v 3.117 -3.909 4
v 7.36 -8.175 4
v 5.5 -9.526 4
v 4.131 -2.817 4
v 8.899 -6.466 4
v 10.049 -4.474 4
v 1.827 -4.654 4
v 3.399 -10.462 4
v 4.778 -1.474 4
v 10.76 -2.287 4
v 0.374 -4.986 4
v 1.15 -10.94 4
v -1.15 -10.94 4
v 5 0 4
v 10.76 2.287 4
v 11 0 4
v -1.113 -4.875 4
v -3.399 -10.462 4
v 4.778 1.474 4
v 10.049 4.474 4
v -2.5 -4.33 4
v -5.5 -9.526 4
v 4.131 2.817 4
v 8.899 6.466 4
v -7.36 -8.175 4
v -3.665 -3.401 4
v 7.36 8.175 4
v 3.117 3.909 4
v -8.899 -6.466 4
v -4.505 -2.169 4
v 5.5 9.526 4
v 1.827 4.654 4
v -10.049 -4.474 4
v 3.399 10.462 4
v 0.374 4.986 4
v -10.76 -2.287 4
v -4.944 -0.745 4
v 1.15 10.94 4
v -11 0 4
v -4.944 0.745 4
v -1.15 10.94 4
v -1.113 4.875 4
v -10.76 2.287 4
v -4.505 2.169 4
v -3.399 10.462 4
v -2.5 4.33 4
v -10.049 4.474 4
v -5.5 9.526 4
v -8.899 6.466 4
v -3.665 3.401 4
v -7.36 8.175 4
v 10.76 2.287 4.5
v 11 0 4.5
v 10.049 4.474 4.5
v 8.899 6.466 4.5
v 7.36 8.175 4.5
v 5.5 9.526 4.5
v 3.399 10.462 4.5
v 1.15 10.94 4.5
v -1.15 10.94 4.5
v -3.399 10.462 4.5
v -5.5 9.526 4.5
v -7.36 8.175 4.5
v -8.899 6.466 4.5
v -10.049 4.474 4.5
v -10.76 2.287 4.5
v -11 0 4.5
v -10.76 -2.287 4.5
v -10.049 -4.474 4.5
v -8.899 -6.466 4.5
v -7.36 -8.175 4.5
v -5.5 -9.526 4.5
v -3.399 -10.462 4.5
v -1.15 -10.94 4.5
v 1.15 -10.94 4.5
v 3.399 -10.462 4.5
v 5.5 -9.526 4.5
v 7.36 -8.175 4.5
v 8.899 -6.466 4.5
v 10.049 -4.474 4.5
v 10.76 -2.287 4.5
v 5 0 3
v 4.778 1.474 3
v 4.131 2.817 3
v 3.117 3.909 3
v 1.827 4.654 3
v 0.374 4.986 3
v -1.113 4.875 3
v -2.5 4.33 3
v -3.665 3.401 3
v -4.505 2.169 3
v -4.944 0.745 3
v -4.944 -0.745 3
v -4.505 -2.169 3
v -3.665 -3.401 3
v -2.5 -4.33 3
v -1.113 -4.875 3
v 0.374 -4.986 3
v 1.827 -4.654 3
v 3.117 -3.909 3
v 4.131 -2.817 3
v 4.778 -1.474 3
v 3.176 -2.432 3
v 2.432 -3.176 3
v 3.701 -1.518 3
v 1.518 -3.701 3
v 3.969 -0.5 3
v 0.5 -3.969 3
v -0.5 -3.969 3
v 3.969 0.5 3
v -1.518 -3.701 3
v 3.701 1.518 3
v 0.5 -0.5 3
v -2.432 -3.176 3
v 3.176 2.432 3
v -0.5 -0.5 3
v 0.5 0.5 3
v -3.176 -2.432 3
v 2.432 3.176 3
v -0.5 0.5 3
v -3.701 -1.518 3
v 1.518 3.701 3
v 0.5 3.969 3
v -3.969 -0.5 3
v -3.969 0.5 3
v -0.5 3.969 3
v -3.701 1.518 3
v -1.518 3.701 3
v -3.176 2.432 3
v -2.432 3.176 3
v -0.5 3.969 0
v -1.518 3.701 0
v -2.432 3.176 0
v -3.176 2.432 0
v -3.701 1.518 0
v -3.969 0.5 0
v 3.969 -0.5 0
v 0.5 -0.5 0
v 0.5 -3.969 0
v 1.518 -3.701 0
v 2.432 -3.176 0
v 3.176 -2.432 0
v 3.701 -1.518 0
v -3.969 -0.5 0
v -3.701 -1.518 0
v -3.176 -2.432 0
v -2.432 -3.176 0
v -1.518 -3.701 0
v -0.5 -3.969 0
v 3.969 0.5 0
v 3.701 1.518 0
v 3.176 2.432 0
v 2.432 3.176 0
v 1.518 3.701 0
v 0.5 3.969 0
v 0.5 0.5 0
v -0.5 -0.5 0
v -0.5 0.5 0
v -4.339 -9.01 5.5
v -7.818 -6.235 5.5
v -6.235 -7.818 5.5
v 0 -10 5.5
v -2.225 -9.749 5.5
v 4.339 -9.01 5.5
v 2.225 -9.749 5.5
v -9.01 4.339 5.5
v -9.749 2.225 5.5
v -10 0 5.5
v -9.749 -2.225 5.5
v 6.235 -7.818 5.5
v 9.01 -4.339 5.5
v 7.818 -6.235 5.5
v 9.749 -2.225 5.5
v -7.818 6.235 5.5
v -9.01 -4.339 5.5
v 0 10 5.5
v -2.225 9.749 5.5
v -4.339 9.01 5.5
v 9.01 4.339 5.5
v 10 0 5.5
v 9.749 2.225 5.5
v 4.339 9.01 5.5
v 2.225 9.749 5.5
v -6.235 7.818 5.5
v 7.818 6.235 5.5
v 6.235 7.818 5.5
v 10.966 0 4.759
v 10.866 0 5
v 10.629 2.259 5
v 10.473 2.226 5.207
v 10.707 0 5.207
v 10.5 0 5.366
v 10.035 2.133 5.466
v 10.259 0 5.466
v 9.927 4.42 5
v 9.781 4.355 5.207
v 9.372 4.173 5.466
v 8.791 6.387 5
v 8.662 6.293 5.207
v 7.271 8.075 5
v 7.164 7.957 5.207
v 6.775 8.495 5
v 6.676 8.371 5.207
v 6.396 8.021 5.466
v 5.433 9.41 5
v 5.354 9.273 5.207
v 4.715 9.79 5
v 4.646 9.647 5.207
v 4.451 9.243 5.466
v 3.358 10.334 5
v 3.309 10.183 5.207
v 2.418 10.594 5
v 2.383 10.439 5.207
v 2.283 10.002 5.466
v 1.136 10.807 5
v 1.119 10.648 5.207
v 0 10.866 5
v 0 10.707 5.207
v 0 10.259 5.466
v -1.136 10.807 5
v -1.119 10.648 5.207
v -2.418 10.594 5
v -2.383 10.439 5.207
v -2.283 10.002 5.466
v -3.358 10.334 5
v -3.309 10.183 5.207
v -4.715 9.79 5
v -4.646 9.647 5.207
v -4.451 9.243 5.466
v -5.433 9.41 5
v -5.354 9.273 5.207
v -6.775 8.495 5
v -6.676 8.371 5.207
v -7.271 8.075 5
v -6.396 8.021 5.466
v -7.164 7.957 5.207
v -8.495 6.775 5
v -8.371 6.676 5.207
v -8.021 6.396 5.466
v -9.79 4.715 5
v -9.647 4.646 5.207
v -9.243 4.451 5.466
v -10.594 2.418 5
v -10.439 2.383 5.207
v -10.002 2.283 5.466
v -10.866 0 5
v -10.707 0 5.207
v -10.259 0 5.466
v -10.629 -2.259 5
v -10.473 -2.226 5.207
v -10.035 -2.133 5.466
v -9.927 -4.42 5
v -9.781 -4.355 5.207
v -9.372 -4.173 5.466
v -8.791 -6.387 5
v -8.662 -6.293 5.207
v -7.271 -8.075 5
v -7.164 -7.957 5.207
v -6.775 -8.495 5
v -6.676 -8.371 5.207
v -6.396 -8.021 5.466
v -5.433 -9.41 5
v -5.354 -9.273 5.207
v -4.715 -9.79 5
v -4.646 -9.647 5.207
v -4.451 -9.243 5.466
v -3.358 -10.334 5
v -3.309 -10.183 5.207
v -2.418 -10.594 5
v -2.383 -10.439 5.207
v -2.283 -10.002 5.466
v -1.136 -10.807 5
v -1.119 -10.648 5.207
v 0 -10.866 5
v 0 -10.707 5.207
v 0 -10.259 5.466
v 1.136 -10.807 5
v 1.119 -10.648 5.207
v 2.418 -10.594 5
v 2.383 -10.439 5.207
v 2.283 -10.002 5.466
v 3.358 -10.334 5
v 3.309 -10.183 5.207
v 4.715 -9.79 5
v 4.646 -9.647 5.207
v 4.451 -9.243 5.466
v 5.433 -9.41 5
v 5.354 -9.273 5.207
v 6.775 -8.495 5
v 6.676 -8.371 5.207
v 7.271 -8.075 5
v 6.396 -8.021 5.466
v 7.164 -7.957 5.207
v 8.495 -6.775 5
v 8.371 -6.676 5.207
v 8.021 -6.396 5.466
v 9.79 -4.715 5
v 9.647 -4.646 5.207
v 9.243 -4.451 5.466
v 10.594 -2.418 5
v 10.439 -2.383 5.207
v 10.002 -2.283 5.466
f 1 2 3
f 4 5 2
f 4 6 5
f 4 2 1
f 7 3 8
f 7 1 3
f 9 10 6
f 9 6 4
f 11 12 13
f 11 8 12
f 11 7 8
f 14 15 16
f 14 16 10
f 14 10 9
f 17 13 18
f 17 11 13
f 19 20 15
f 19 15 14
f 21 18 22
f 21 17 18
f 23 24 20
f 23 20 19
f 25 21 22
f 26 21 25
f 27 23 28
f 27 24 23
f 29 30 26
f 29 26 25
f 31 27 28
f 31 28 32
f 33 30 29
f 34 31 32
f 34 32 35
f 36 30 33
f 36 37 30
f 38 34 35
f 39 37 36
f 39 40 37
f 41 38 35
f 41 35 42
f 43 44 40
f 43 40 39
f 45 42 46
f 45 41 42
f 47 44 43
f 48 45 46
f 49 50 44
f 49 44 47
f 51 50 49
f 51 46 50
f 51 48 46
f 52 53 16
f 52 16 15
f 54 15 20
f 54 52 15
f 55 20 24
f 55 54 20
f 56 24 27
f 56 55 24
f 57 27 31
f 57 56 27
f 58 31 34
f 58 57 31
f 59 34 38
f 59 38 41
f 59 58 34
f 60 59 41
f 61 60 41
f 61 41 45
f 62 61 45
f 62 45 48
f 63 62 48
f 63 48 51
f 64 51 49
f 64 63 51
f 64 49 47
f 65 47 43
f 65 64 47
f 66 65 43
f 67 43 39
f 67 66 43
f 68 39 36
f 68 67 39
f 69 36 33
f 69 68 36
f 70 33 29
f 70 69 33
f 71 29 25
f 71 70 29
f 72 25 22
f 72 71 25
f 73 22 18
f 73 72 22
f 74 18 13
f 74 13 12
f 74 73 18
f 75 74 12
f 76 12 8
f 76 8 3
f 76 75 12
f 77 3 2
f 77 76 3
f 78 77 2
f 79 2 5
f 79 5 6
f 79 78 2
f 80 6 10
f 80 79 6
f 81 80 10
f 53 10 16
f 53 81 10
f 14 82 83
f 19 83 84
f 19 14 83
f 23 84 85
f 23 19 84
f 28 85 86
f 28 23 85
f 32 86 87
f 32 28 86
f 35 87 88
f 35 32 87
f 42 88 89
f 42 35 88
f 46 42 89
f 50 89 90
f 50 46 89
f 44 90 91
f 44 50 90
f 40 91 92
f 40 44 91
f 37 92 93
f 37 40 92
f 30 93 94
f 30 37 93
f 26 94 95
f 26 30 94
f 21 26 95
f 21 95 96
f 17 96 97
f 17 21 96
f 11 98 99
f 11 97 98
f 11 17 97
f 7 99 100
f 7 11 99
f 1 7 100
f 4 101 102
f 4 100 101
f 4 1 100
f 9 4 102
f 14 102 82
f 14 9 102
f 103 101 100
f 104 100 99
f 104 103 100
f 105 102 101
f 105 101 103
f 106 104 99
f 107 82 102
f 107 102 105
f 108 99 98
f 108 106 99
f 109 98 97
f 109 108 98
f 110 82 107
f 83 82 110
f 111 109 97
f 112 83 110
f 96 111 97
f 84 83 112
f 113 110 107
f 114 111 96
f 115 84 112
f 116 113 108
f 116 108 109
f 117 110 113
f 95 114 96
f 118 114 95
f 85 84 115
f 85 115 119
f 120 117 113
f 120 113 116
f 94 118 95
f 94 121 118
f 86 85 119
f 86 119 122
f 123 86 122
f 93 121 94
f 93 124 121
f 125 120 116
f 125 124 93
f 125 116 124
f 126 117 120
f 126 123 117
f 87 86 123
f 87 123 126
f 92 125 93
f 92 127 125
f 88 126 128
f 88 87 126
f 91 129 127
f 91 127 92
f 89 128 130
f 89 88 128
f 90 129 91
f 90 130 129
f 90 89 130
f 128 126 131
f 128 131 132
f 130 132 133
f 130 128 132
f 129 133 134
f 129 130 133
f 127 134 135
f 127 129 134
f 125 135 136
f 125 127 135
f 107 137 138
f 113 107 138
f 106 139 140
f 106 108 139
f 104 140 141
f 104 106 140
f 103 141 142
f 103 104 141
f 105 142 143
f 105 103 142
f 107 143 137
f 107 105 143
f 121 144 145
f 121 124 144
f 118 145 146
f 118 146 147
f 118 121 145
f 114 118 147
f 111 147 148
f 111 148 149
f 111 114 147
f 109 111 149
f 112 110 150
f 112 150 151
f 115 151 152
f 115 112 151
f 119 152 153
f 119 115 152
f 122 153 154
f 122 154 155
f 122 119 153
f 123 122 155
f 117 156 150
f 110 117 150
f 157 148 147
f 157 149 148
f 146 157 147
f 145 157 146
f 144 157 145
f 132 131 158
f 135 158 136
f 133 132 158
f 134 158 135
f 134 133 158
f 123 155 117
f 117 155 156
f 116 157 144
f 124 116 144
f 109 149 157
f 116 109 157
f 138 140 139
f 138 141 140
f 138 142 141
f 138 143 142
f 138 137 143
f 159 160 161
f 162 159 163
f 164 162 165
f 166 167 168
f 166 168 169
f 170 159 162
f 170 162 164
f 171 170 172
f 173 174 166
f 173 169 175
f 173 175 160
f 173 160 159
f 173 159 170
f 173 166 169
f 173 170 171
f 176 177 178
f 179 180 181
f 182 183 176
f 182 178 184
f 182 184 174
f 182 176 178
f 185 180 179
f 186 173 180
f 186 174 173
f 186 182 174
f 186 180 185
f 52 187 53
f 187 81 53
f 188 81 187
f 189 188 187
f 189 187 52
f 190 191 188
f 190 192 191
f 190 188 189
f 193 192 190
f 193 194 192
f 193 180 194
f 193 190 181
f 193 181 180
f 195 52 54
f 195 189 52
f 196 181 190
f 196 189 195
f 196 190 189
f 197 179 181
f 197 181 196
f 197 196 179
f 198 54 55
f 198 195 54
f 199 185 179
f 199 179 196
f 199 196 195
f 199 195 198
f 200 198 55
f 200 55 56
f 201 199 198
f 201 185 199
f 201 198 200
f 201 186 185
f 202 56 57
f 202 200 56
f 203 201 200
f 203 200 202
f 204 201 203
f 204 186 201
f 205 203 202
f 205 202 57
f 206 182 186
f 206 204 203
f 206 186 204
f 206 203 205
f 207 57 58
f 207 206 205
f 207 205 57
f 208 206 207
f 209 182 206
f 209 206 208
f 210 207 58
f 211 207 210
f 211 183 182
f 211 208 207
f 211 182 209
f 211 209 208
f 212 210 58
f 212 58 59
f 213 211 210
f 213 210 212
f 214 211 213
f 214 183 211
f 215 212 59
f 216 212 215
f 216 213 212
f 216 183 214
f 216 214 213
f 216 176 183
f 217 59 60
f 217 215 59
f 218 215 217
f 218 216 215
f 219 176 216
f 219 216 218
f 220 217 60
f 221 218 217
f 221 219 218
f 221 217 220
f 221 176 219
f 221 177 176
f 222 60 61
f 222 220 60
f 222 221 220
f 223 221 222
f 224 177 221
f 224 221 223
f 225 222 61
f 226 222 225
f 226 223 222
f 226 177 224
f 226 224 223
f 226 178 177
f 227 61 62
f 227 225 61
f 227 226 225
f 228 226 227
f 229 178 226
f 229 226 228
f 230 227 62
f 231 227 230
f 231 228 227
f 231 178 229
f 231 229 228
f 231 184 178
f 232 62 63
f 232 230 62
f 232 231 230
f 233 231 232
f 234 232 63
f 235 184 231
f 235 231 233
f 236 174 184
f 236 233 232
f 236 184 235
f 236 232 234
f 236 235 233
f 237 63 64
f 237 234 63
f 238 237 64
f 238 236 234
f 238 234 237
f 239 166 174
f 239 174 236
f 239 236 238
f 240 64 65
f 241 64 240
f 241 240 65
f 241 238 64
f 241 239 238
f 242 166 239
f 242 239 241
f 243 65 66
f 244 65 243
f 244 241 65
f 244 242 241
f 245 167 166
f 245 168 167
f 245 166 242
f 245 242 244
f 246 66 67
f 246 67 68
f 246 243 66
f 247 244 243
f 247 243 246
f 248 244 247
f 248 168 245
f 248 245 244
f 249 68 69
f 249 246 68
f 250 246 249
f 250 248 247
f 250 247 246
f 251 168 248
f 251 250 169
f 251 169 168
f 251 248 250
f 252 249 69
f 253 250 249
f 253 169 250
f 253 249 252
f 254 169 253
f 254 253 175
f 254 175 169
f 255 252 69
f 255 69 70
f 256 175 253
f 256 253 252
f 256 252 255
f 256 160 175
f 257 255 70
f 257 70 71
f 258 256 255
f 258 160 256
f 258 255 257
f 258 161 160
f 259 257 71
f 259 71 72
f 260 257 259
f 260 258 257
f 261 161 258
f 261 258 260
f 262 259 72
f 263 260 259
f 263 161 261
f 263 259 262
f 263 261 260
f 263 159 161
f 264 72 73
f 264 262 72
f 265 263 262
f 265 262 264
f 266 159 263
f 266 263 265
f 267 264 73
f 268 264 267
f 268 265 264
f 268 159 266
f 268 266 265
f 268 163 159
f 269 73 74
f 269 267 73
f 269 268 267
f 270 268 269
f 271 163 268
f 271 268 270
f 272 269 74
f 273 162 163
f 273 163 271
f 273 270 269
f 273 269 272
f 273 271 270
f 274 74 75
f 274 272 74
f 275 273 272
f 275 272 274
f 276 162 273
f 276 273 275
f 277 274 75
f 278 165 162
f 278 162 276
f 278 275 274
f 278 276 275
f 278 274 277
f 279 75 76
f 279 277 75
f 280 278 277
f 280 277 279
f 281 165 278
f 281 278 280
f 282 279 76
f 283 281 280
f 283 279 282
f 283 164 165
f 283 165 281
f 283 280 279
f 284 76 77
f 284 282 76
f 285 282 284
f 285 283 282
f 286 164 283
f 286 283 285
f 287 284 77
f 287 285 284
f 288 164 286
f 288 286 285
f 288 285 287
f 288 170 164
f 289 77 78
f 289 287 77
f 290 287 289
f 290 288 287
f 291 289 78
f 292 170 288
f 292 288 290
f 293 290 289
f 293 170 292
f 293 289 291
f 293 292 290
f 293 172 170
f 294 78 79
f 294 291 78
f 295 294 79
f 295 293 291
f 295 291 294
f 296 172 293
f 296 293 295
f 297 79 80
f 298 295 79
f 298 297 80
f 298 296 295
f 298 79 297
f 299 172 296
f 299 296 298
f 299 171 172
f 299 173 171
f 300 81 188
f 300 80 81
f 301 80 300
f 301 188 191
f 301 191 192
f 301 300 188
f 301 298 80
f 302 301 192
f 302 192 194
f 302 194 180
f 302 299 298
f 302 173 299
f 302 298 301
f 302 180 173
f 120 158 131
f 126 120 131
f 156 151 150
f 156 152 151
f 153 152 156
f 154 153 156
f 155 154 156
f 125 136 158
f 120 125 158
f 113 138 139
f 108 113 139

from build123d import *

# Parameters (mm, degrees)
F3_DEPTH = 3
F4_R     = 1


with BuildPart() as f1:
    # F0 (on Front) → F1 (revolve)
    with BuildSketch(Plane.XZ):
        Polygon((0, 5.5), (0, 0), (4, 0), (4, 3), (5, 3), (5, 4), (11, 4), (11, 5.5), align=None)
    revolve(axis=Axis((0, 0, 5.302473), (0, 0, 1)))

    # F2 (on face) → F3 (cut, through all)
    with BuildSketch(Plane(origin=(0, 0, 0), x_dir=(1, 0, 0), z_dir=(0, 0, -1))):
        Polygon((-0.5, -6.403249), (0.5, -6.403249), (0.5, -0.5), (5.621079, -0.5), (5.621079, 0.5), (0.5, 0.5), (0.5, 6.403249), (-0.5, 6.403249), (-0.5, 0.5), (-5.621079, 0.5), (-5.621079, -0.5), (-0.5, -0.5), align=None)
    extrude(amount=-F3_DEPTH, mode=Mode.SUBTRACT)

    # F4
    f4_edges = [f1.edges().sort_by_distance(p)[0] for p in [
        (-11, 0, 5.5),
    ]]
    fillet(f4_edges, radius=F4_R)


solid = f1.part
